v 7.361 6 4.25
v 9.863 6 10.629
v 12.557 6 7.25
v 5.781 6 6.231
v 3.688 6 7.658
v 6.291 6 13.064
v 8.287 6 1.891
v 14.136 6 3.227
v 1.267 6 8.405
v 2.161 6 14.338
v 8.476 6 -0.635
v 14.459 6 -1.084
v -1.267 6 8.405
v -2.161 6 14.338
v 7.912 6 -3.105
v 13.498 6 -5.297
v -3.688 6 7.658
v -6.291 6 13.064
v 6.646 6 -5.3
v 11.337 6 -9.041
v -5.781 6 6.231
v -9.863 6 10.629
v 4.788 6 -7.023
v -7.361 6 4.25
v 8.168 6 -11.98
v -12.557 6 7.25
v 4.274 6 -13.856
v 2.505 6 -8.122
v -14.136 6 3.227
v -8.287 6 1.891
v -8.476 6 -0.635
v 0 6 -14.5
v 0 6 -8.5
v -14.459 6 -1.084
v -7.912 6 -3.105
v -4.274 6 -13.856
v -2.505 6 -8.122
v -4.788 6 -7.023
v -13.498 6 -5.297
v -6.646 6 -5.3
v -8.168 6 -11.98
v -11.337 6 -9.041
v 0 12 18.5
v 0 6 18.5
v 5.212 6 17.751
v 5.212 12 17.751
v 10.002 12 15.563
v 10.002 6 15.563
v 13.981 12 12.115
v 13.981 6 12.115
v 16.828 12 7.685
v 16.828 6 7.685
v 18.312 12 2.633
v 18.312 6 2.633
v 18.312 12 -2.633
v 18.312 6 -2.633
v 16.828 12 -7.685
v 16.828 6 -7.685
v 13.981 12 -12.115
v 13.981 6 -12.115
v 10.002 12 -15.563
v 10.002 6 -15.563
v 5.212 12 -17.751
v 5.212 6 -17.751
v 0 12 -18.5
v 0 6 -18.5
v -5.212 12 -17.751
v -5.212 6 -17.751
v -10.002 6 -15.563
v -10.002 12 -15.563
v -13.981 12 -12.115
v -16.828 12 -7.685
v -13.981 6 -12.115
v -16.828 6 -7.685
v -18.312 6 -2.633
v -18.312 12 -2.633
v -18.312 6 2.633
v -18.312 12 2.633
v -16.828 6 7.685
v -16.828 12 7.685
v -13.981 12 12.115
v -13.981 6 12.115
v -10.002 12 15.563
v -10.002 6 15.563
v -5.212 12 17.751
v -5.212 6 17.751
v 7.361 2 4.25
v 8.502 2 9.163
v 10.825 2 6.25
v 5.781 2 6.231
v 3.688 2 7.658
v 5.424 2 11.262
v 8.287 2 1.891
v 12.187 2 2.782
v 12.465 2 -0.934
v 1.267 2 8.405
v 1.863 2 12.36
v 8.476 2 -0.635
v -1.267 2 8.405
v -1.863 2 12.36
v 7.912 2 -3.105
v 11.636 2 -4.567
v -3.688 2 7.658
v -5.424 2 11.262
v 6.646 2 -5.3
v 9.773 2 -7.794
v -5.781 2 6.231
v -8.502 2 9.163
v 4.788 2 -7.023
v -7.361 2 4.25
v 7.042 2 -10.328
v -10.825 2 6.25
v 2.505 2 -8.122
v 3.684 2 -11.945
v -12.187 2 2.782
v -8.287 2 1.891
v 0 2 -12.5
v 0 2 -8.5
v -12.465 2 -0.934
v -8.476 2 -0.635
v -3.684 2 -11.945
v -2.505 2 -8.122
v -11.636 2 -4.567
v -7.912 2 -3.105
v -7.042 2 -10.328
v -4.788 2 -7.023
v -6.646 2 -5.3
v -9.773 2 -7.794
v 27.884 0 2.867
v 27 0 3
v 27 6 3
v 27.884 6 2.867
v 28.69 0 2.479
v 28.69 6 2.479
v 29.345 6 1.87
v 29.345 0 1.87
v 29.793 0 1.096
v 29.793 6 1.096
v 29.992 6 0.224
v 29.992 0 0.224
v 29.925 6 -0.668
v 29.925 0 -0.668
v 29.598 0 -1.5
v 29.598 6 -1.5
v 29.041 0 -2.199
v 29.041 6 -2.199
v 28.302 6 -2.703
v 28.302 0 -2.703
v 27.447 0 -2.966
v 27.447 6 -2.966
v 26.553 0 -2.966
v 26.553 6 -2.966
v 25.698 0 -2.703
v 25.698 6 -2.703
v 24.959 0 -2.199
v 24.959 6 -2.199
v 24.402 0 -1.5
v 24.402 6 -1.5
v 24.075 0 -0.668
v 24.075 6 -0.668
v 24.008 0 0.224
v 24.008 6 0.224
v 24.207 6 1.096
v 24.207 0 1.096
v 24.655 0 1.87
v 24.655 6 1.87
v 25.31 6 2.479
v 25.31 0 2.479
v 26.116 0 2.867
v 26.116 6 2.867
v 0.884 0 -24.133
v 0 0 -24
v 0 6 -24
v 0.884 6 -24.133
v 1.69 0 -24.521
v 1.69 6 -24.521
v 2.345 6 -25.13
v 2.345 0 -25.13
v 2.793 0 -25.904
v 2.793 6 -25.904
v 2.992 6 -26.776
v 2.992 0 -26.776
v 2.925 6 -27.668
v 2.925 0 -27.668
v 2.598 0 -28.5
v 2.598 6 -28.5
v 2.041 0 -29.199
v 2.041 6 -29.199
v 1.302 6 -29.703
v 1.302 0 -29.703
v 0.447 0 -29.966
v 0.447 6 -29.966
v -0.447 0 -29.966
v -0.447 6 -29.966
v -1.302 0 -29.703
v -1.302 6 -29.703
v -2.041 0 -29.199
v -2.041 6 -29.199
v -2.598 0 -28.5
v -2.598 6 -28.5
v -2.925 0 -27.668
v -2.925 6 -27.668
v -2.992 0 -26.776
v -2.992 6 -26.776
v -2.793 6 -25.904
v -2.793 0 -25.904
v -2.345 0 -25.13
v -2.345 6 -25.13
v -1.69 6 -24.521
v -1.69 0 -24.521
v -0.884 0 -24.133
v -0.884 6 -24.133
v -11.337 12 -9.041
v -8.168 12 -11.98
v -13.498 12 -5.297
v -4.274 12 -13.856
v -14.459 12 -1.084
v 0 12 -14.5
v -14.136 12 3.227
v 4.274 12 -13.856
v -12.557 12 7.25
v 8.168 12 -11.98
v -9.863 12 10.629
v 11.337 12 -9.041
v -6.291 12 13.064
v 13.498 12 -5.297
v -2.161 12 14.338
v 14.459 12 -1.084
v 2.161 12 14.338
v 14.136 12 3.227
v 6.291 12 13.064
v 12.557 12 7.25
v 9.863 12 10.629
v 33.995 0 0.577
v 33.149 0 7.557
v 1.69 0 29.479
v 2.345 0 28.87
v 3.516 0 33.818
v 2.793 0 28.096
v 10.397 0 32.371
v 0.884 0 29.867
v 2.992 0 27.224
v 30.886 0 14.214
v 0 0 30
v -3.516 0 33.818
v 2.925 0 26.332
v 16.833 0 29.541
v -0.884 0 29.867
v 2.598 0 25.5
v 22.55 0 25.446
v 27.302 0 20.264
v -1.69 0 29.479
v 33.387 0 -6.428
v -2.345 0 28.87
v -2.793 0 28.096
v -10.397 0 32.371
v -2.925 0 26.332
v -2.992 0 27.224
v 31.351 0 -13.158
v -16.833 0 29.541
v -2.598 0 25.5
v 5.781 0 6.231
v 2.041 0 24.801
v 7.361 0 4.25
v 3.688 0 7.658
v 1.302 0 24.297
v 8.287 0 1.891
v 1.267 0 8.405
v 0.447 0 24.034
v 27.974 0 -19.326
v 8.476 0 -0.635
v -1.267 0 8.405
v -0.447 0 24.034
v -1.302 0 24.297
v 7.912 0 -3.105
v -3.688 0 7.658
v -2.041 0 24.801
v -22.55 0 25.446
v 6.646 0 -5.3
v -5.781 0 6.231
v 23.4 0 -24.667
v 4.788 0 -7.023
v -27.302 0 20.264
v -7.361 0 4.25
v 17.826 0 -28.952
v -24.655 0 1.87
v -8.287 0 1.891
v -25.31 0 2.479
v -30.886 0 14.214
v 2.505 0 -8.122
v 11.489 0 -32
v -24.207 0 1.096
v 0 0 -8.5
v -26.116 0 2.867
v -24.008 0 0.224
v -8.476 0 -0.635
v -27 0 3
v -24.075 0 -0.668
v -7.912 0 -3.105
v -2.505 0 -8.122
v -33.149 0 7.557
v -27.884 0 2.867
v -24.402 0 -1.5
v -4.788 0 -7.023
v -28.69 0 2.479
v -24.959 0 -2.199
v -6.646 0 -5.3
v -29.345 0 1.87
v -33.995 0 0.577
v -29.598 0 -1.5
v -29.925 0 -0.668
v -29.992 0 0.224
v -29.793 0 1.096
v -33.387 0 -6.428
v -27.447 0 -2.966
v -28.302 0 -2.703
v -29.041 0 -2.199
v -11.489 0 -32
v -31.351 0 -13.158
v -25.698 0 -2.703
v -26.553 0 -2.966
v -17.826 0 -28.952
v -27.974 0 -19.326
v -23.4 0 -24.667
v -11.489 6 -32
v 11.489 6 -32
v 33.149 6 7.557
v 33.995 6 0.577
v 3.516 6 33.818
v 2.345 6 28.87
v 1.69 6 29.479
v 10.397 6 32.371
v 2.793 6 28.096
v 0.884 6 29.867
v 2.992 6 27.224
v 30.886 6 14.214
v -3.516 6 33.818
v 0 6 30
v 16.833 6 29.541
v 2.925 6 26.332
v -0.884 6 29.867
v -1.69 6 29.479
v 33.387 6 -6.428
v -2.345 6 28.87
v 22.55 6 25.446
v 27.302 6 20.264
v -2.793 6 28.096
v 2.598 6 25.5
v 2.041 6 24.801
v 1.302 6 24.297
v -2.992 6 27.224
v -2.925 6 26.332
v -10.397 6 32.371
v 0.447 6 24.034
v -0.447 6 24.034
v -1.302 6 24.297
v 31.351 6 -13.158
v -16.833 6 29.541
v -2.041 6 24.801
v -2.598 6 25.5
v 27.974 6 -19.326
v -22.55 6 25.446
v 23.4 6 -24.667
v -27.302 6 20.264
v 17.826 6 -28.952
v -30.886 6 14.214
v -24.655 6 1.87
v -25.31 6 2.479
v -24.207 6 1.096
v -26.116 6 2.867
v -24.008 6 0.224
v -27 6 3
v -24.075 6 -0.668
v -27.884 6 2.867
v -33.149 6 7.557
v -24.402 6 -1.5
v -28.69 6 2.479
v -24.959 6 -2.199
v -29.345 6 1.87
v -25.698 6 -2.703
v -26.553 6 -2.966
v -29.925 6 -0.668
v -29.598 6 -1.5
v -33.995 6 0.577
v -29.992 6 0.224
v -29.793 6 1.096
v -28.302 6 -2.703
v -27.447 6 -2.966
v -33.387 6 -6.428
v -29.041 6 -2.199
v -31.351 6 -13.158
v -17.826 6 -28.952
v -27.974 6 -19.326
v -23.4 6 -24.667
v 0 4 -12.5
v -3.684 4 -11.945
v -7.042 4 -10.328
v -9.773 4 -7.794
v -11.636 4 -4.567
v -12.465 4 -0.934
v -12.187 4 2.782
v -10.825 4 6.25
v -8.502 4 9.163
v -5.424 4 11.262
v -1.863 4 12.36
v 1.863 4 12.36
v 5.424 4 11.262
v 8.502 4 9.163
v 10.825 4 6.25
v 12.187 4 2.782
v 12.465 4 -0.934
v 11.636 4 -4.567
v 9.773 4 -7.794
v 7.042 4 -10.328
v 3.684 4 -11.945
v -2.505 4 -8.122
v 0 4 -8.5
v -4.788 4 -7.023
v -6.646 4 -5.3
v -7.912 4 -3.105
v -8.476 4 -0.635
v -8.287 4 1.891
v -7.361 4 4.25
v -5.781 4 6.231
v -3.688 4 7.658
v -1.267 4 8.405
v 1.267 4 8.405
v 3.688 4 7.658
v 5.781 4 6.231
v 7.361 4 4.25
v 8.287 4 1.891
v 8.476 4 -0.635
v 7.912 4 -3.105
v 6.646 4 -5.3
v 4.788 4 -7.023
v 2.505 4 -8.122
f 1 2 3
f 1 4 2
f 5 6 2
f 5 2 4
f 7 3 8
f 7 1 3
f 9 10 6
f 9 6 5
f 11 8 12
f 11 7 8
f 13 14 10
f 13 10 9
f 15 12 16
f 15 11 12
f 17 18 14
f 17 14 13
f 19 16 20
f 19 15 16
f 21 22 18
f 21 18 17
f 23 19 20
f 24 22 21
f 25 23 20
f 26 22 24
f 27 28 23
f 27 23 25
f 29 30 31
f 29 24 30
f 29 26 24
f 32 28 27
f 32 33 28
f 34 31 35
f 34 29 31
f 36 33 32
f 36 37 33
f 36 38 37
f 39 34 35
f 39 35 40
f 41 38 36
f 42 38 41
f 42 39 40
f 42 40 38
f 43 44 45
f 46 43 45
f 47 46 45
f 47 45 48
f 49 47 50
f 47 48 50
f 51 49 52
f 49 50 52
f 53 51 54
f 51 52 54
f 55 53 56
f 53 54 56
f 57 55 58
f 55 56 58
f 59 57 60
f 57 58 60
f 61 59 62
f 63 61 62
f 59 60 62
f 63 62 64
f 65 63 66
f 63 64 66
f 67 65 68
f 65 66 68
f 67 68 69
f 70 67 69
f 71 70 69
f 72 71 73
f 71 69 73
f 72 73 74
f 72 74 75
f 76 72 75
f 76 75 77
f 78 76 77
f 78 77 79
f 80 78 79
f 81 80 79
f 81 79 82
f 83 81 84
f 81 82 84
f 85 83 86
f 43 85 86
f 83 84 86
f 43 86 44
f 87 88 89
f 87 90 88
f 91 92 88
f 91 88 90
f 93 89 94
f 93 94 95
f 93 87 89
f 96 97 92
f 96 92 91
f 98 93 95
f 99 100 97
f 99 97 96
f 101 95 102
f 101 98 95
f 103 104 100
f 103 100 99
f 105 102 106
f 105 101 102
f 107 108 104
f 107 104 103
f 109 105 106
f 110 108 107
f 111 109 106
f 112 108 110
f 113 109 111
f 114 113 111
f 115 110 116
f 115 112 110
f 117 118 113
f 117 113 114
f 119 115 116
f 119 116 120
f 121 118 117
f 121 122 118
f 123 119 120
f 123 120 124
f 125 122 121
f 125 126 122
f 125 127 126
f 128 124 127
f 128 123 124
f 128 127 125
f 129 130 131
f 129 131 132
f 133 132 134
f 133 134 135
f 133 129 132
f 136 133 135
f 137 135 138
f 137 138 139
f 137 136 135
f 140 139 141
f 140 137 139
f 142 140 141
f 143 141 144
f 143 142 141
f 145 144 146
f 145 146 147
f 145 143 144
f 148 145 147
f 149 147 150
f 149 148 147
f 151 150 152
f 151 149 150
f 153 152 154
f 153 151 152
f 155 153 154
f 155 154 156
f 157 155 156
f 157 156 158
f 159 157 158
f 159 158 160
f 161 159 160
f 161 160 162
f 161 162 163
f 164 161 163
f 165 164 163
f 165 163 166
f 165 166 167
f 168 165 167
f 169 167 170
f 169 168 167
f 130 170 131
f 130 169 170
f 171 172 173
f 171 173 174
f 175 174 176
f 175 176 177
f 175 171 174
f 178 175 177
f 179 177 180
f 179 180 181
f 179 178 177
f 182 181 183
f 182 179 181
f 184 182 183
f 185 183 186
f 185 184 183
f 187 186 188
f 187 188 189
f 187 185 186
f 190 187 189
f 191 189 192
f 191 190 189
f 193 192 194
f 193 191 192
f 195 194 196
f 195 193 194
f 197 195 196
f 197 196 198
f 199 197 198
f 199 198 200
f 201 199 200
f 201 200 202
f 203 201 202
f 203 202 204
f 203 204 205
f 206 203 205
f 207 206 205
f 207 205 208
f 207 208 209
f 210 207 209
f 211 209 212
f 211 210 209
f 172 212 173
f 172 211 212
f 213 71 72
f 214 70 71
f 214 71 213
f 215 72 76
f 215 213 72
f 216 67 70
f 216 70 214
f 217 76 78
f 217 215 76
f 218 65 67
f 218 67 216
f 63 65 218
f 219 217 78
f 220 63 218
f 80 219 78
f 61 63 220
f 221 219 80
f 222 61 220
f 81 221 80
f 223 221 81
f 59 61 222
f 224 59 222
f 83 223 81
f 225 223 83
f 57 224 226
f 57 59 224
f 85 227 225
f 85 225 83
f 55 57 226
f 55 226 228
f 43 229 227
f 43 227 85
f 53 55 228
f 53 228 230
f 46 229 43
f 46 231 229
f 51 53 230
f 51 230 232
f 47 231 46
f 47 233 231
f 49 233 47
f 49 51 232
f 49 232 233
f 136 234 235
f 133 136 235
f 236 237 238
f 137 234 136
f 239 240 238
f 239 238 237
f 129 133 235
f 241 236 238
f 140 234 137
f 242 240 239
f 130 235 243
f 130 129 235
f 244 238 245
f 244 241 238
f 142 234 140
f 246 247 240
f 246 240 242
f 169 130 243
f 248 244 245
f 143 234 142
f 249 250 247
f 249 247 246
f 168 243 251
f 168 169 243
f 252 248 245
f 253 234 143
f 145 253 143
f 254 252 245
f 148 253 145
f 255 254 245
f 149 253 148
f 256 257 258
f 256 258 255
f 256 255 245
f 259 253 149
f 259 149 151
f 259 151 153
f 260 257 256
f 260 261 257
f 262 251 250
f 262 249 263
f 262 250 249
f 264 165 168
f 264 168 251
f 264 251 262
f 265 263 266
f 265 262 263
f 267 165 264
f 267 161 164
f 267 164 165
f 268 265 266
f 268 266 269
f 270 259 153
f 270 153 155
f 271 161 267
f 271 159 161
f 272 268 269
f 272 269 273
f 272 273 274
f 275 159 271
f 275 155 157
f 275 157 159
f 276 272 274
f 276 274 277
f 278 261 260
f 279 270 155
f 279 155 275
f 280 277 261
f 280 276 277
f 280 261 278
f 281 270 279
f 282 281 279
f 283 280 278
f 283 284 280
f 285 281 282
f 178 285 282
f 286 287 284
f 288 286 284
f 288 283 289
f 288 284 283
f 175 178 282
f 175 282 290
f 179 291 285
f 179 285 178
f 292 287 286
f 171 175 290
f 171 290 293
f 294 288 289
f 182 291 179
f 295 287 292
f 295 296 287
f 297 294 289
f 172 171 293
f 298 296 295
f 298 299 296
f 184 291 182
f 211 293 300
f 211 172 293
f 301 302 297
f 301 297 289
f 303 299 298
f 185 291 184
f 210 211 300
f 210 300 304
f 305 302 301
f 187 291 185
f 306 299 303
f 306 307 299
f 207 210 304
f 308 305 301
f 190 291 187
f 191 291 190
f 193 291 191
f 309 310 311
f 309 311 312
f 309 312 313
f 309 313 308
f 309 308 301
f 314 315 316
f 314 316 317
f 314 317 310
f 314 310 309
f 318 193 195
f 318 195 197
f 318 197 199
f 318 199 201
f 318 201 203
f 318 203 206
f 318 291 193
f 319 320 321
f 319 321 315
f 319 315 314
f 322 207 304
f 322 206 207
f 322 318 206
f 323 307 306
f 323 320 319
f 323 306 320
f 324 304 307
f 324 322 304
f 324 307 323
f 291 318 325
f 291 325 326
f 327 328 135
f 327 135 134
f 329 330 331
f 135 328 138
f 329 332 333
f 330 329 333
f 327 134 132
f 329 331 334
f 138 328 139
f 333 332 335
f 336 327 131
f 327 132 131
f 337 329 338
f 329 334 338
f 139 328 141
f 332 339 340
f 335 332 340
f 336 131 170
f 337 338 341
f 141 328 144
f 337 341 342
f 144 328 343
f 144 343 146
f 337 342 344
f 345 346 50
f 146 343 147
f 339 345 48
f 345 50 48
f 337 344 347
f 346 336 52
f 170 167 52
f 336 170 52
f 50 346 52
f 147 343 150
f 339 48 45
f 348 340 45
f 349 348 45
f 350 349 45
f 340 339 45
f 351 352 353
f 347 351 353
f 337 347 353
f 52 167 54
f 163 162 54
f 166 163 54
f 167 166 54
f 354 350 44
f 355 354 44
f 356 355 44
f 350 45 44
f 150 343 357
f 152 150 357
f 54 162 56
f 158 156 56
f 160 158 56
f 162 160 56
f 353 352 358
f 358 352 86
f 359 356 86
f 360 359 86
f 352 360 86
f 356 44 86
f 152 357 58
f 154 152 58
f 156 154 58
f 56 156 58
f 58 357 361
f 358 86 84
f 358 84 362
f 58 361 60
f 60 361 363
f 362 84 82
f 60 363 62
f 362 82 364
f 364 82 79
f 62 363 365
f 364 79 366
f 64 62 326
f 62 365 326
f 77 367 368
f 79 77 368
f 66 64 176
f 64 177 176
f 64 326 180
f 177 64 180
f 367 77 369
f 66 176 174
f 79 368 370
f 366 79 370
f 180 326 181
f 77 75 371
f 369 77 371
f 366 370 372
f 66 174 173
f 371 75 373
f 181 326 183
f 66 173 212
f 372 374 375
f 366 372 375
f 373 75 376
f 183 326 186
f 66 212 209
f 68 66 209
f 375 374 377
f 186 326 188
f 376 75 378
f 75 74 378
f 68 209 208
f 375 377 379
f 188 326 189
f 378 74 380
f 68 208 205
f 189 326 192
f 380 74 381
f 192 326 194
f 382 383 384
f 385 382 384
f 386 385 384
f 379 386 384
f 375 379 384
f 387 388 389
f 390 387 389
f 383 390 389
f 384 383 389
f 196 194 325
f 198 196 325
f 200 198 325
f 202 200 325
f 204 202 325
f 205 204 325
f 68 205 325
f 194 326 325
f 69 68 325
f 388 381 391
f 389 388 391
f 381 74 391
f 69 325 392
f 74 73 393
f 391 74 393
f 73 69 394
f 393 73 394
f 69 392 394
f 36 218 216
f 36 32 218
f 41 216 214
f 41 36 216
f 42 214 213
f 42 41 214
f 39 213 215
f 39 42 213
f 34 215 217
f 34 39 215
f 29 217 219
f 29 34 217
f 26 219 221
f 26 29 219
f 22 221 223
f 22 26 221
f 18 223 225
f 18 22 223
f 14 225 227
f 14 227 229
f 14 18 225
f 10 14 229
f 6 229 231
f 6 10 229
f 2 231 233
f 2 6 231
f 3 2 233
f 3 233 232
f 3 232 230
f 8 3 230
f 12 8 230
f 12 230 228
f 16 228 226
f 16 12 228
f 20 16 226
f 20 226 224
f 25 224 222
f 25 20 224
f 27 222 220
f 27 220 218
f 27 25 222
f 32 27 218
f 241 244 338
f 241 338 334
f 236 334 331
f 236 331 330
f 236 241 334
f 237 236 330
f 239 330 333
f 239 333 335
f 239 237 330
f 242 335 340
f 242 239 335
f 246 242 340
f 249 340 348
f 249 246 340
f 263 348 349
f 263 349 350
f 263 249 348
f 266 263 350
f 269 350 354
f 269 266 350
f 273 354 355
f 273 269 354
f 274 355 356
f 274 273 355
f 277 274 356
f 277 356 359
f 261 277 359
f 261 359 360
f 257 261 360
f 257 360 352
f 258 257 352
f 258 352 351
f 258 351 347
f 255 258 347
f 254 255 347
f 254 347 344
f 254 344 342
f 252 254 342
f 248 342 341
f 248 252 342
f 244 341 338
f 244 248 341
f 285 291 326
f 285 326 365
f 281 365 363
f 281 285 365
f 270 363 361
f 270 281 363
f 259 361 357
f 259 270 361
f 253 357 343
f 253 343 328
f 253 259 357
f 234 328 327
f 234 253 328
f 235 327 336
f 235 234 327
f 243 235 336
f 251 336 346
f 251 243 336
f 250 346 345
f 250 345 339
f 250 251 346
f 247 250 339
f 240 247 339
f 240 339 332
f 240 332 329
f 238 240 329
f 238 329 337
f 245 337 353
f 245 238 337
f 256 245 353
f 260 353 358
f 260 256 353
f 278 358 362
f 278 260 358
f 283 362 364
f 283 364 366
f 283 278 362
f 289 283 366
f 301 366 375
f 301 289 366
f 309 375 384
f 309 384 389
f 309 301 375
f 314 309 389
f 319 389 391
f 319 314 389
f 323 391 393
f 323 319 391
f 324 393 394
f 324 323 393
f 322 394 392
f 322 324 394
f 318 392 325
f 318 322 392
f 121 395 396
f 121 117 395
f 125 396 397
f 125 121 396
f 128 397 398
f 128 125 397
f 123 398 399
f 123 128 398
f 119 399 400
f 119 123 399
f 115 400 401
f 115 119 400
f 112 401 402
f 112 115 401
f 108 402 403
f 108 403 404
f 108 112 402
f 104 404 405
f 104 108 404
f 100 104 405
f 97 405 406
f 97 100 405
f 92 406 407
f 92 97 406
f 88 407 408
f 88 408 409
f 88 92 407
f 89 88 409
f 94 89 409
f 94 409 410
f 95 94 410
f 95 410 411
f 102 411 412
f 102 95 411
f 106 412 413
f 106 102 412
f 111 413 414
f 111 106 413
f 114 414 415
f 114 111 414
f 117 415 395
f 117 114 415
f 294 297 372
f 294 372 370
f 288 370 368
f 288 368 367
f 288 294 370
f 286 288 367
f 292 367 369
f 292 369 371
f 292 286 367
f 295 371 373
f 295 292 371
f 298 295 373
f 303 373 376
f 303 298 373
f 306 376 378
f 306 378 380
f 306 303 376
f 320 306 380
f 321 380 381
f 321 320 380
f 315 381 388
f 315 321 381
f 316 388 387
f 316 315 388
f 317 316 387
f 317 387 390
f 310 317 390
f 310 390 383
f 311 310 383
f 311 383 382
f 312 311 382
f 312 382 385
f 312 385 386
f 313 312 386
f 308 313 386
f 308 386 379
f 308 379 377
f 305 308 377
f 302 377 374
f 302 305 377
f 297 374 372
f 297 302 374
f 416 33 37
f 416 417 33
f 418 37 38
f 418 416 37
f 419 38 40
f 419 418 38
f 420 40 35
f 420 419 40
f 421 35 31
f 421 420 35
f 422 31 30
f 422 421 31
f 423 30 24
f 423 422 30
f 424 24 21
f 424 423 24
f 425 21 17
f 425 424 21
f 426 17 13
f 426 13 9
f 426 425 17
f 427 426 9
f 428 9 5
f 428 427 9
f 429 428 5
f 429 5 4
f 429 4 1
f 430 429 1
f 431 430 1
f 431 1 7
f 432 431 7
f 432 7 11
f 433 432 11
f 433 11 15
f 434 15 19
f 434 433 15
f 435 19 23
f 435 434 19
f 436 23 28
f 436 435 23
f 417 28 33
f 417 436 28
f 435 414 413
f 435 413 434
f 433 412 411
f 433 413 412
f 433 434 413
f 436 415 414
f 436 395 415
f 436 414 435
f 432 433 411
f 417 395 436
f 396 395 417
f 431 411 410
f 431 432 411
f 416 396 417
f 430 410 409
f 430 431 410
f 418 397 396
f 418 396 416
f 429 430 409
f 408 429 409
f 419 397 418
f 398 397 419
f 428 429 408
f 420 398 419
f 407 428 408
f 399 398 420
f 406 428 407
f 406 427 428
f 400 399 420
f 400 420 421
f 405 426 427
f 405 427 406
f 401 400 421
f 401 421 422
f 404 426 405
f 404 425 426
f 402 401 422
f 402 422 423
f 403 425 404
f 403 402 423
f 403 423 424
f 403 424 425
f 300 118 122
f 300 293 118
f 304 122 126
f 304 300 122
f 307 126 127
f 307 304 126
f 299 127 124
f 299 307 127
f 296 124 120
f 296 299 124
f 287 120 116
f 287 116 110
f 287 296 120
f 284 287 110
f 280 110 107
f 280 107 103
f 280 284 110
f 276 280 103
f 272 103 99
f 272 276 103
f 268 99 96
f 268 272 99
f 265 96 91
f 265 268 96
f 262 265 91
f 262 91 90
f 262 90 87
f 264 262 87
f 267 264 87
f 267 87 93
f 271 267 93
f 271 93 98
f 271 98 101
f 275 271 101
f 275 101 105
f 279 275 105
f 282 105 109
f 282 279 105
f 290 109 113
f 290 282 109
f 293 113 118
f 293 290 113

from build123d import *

# Parameters (mm, degrees)
SKETCH_1_R      = 3
EXTRUDE_1_DEPTH = 6
SKETCH_2_R      = 18.5
EXTRUDE_2_DEPTH = 6


with BuildPart() as part:
    # 草图1 → 凸台-拉伸1 (new body)
    with BuildSketch(Plane(origin=(0, 0, 0), x_dir=(1, 0, 0), z_dir=(0, 1, 0))):
        with BuildLine():
            Line((-11.489125293, 32), (11.489125293, 32))
            ThreePointArc((11.489125293, 32), (0, -34), (-11.489125293, 32))
        make_face()
        with Locations(Location((0, 27, 0), (0, 0, 270))):
            Circle(SKETCH_1_R, mode=Mode.SUBTRACT)
        with Locations(Location((27, 0, 0), (0, 0, 270))):
            Circle(SKETCH_1_R, mode=Mode.SUBTRACT)
        with Locations(Location((0, -27, 0), (0, 0, 270))):
            Circle(SKETCH_1_R, mode=Mode.SUBTRACT)
        with Locations(Location((-27, 0, 0), (0, 0, 270))):
            Circle(SKETCH_1_R, mode=Mode.SUBTRACT)
    extrude(amount=EXTRUDE_1_DEPTH)

    # 草图2 → 凸台-拉伸2 (add)
    with BuildSketch(Plane(origin=(0, 6, 0), x_dir=(1, 0, 0), z_dir=(0, 1, 0))):
        with Locations(Location((0, 0, 0), (0, 0, 270))):
            Circle(SKETCH_2_R)
    extrude(amount=EXTRUDE_2_DEPTH)

    # 草图3 → 切除-旋转1 (revolve, cut)
    with BuildSketch(Plane.XY, mode=Mode.PRIVATE) as cut_revolve_1_sk:
        Polygon((0, 12), (14.5, 12), (14.5, 6), (8.5, 6), (8.5, 4), (12.5, 4), (12.5, 2), (8.5, 2), (8.5, 0), (0, 0), align=None)
    revolve(cut_revolve_1_sk.sketch.rotate(Axis((0, 0, 0), (0, 1, 0)), 90), axis=Axis((0, 0, 0), (0, 1, 0)), mode=Mode.SUBTRACT)


solid = part.part
